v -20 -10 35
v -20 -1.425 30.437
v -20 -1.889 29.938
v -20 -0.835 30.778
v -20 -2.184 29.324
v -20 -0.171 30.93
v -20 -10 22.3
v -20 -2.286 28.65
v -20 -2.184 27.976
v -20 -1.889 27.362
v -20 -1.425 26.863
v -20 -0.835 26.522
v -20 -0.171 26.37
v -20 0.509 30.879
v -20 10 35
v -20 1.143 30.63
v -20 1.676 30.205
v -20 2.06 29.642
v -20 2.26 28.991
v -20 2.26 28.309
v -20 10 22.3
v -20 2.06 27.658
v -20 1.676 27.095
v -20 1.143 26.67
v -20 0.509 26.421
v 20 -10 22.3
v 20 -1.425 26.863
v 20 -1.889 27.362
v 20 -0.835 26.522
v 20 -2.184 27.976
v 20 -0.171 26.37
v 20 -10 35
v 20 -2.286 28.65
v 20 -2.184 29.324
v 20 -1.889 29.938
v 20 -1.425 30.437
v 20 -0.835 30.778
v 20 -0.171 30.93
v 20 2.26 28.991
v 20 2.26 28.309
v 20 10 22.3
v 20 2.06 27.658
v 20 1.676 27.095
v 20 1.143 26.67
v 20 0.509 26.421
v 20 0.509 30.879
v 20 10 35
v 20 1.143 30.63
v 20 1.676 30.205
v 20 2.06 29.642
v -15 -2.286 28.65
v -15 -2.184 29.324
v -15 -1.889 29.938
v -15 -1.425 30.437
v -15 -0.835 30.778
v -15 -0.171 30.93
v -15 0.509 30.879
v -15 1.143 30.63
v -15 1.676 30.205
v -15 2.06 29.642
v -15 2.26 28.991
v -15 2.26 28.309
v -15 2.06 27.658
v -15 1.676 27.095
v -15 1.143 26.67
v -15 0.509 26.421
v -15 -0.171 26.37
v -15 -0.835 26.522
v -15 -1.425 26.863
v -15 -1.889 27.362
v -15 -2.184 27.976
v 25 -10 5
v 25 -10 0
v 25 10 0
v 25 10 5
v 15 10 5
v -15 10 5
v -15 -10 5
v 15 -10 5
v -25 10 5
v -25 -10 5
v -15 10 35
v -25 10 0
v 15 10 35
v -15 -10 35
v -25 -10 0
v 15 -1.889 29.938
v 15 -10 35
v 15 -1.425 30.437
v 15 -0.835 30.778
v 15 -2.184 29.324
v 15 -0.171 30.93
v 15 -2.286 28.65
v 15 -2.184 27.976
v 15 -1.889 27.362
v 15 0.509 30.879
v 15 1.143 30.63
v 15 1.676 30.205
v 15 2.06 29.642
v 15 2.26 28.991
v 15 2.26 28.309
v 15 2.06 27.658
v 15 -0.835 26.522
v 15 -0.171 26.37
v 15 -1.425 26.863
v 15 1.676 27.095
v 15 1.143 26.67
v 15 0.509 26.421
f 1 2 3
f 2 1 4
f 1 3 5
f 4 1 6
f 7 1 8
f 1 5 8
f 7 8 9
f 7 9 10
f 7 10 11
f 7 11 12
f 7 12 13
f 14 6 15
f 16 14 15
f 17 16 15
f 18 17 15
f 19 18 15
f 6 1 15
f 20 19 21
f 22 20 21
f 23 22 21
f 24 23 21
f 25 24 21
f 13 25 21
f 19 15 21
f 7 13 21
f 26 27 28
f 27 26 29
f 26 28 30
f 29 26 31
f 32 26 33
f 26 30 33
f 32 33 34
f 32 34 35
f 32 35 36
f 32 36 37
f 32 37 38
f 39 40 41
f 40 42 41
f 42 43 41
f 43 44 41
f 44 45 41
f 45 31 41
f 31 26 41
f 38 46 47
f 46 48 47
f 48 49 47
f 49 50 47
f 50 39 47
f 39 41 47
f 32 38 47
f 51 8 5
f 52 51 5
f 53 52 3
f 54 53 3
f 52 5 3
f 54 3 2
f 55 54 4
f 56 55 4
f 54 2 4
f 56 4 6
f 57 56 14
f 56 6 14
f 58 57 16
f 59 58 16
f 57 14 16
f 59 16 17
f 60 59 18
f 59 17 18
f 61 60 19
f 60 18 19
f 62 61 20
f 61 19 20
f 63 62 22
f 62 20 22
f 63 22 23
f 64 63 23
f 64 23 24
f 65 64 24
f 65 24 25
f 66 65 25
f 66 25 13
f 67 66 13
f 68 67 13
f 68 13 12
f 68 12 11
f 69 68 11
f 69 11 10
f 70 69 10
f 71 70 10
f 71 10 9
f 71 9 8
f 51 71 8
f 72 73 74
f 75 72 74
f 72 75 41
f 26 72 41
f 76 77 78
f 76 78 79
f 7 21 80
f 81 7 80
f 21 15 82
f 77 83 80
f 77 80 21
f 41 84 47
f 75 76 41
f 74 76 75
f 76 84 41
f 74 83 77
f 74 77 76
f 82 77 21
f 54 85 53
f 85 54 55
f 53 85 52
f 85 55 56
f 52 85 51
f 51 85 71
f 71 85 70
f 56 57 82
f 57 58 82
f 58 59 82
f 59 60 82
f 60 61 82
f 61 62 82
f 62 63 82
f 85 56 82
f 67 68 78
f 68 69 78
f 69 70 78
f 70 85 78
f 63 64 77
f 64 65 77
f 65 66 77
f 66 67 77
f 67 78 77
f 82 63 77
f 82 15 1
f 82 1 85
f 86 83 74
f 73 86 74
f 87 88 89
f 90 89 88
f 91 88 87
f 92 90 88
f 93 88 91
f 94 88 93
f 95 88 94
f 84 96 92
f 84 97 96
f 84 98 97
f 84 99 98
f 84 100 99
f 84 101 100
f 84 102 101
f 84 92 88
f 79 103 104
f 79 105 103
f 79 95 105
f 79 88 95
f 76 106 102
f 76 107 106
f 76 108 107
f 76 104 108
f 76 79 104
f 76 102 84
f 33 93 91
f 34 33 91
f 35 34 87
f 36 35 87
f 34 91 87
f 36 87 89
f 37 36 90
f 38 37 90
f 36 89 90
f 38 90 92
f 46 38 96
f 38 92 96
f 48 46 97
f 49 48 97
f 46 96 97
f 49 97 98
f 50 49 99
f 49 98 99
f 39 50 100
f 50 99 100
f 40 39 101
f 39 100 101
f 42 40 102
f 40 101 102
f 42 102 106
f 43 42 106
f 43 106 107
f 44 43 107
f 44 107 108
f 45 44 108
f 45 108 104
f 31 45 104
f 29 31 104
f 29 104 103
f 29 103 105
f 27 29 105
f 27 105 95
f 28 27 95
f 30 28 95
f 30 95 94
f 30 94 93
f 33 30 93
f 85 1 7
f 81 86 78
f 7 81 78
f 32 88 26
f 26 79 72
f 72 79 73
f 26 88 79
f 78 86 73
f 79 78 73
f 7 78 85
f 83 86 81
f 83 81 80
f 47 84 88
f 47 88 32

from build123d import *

# Parameters (mm, degrees)
F0_W     = 50
F0_H     = 20
F1_DEPTH = 5
F2_W     = 10
F2_H     = 20
F3_DEPTH = 30
F5_DEPTH = 20.001
F6_R     = 2.286
F7_DEPTH = 45.001


with BuildPart() as f1:
    # F0 (on Top) → F1 (new body)
    with BuildSketch(Plane.XY):
        Rectangle(F0_W, F0_H)
    extrude(amount=F1_DEPTH)

    # F2 (on face) → F3 (join)
    with BuildSketch(Plane.XY.offset(5)):
        with Locations((20, 0)):
            Rectangle(F2_W, F2_H)
        with Locations((-20, 0)):
            Rectangle(F2_W, F2_H)
    extrude(amount=F3_DEPTH)

    # F4 (on face) → F5 (cut, through all)
    with BuildSketch(Plane(origin=(0, 10, 0), x_dir=(-1, 0, 0), z_dir=(0, 1, 0))):
        Polygon((-25, 5), (-20, 22.3), (-20, 35), (-25, 35), align=None)
        Polygon((20, 35), (20, 22.3), (25, 5), (25, 35), align=None)
    extrude(amount=-F5_DEPTH, mode=Mode.SUBTRACT)

    # F6 (on face) → F7 (cut, through all)
    with BuildSketch(Plane(origin=(-20, 0, 0), x_dir=(0, -1, 0), z_dir=(-1, 0, 0))):
        with Locations((0, 28.65)):
            Circle(F6_R)
    extrude(amount=-F7_DEPTH, mode=Mode.SUBTRACT)


solid = f1.part
